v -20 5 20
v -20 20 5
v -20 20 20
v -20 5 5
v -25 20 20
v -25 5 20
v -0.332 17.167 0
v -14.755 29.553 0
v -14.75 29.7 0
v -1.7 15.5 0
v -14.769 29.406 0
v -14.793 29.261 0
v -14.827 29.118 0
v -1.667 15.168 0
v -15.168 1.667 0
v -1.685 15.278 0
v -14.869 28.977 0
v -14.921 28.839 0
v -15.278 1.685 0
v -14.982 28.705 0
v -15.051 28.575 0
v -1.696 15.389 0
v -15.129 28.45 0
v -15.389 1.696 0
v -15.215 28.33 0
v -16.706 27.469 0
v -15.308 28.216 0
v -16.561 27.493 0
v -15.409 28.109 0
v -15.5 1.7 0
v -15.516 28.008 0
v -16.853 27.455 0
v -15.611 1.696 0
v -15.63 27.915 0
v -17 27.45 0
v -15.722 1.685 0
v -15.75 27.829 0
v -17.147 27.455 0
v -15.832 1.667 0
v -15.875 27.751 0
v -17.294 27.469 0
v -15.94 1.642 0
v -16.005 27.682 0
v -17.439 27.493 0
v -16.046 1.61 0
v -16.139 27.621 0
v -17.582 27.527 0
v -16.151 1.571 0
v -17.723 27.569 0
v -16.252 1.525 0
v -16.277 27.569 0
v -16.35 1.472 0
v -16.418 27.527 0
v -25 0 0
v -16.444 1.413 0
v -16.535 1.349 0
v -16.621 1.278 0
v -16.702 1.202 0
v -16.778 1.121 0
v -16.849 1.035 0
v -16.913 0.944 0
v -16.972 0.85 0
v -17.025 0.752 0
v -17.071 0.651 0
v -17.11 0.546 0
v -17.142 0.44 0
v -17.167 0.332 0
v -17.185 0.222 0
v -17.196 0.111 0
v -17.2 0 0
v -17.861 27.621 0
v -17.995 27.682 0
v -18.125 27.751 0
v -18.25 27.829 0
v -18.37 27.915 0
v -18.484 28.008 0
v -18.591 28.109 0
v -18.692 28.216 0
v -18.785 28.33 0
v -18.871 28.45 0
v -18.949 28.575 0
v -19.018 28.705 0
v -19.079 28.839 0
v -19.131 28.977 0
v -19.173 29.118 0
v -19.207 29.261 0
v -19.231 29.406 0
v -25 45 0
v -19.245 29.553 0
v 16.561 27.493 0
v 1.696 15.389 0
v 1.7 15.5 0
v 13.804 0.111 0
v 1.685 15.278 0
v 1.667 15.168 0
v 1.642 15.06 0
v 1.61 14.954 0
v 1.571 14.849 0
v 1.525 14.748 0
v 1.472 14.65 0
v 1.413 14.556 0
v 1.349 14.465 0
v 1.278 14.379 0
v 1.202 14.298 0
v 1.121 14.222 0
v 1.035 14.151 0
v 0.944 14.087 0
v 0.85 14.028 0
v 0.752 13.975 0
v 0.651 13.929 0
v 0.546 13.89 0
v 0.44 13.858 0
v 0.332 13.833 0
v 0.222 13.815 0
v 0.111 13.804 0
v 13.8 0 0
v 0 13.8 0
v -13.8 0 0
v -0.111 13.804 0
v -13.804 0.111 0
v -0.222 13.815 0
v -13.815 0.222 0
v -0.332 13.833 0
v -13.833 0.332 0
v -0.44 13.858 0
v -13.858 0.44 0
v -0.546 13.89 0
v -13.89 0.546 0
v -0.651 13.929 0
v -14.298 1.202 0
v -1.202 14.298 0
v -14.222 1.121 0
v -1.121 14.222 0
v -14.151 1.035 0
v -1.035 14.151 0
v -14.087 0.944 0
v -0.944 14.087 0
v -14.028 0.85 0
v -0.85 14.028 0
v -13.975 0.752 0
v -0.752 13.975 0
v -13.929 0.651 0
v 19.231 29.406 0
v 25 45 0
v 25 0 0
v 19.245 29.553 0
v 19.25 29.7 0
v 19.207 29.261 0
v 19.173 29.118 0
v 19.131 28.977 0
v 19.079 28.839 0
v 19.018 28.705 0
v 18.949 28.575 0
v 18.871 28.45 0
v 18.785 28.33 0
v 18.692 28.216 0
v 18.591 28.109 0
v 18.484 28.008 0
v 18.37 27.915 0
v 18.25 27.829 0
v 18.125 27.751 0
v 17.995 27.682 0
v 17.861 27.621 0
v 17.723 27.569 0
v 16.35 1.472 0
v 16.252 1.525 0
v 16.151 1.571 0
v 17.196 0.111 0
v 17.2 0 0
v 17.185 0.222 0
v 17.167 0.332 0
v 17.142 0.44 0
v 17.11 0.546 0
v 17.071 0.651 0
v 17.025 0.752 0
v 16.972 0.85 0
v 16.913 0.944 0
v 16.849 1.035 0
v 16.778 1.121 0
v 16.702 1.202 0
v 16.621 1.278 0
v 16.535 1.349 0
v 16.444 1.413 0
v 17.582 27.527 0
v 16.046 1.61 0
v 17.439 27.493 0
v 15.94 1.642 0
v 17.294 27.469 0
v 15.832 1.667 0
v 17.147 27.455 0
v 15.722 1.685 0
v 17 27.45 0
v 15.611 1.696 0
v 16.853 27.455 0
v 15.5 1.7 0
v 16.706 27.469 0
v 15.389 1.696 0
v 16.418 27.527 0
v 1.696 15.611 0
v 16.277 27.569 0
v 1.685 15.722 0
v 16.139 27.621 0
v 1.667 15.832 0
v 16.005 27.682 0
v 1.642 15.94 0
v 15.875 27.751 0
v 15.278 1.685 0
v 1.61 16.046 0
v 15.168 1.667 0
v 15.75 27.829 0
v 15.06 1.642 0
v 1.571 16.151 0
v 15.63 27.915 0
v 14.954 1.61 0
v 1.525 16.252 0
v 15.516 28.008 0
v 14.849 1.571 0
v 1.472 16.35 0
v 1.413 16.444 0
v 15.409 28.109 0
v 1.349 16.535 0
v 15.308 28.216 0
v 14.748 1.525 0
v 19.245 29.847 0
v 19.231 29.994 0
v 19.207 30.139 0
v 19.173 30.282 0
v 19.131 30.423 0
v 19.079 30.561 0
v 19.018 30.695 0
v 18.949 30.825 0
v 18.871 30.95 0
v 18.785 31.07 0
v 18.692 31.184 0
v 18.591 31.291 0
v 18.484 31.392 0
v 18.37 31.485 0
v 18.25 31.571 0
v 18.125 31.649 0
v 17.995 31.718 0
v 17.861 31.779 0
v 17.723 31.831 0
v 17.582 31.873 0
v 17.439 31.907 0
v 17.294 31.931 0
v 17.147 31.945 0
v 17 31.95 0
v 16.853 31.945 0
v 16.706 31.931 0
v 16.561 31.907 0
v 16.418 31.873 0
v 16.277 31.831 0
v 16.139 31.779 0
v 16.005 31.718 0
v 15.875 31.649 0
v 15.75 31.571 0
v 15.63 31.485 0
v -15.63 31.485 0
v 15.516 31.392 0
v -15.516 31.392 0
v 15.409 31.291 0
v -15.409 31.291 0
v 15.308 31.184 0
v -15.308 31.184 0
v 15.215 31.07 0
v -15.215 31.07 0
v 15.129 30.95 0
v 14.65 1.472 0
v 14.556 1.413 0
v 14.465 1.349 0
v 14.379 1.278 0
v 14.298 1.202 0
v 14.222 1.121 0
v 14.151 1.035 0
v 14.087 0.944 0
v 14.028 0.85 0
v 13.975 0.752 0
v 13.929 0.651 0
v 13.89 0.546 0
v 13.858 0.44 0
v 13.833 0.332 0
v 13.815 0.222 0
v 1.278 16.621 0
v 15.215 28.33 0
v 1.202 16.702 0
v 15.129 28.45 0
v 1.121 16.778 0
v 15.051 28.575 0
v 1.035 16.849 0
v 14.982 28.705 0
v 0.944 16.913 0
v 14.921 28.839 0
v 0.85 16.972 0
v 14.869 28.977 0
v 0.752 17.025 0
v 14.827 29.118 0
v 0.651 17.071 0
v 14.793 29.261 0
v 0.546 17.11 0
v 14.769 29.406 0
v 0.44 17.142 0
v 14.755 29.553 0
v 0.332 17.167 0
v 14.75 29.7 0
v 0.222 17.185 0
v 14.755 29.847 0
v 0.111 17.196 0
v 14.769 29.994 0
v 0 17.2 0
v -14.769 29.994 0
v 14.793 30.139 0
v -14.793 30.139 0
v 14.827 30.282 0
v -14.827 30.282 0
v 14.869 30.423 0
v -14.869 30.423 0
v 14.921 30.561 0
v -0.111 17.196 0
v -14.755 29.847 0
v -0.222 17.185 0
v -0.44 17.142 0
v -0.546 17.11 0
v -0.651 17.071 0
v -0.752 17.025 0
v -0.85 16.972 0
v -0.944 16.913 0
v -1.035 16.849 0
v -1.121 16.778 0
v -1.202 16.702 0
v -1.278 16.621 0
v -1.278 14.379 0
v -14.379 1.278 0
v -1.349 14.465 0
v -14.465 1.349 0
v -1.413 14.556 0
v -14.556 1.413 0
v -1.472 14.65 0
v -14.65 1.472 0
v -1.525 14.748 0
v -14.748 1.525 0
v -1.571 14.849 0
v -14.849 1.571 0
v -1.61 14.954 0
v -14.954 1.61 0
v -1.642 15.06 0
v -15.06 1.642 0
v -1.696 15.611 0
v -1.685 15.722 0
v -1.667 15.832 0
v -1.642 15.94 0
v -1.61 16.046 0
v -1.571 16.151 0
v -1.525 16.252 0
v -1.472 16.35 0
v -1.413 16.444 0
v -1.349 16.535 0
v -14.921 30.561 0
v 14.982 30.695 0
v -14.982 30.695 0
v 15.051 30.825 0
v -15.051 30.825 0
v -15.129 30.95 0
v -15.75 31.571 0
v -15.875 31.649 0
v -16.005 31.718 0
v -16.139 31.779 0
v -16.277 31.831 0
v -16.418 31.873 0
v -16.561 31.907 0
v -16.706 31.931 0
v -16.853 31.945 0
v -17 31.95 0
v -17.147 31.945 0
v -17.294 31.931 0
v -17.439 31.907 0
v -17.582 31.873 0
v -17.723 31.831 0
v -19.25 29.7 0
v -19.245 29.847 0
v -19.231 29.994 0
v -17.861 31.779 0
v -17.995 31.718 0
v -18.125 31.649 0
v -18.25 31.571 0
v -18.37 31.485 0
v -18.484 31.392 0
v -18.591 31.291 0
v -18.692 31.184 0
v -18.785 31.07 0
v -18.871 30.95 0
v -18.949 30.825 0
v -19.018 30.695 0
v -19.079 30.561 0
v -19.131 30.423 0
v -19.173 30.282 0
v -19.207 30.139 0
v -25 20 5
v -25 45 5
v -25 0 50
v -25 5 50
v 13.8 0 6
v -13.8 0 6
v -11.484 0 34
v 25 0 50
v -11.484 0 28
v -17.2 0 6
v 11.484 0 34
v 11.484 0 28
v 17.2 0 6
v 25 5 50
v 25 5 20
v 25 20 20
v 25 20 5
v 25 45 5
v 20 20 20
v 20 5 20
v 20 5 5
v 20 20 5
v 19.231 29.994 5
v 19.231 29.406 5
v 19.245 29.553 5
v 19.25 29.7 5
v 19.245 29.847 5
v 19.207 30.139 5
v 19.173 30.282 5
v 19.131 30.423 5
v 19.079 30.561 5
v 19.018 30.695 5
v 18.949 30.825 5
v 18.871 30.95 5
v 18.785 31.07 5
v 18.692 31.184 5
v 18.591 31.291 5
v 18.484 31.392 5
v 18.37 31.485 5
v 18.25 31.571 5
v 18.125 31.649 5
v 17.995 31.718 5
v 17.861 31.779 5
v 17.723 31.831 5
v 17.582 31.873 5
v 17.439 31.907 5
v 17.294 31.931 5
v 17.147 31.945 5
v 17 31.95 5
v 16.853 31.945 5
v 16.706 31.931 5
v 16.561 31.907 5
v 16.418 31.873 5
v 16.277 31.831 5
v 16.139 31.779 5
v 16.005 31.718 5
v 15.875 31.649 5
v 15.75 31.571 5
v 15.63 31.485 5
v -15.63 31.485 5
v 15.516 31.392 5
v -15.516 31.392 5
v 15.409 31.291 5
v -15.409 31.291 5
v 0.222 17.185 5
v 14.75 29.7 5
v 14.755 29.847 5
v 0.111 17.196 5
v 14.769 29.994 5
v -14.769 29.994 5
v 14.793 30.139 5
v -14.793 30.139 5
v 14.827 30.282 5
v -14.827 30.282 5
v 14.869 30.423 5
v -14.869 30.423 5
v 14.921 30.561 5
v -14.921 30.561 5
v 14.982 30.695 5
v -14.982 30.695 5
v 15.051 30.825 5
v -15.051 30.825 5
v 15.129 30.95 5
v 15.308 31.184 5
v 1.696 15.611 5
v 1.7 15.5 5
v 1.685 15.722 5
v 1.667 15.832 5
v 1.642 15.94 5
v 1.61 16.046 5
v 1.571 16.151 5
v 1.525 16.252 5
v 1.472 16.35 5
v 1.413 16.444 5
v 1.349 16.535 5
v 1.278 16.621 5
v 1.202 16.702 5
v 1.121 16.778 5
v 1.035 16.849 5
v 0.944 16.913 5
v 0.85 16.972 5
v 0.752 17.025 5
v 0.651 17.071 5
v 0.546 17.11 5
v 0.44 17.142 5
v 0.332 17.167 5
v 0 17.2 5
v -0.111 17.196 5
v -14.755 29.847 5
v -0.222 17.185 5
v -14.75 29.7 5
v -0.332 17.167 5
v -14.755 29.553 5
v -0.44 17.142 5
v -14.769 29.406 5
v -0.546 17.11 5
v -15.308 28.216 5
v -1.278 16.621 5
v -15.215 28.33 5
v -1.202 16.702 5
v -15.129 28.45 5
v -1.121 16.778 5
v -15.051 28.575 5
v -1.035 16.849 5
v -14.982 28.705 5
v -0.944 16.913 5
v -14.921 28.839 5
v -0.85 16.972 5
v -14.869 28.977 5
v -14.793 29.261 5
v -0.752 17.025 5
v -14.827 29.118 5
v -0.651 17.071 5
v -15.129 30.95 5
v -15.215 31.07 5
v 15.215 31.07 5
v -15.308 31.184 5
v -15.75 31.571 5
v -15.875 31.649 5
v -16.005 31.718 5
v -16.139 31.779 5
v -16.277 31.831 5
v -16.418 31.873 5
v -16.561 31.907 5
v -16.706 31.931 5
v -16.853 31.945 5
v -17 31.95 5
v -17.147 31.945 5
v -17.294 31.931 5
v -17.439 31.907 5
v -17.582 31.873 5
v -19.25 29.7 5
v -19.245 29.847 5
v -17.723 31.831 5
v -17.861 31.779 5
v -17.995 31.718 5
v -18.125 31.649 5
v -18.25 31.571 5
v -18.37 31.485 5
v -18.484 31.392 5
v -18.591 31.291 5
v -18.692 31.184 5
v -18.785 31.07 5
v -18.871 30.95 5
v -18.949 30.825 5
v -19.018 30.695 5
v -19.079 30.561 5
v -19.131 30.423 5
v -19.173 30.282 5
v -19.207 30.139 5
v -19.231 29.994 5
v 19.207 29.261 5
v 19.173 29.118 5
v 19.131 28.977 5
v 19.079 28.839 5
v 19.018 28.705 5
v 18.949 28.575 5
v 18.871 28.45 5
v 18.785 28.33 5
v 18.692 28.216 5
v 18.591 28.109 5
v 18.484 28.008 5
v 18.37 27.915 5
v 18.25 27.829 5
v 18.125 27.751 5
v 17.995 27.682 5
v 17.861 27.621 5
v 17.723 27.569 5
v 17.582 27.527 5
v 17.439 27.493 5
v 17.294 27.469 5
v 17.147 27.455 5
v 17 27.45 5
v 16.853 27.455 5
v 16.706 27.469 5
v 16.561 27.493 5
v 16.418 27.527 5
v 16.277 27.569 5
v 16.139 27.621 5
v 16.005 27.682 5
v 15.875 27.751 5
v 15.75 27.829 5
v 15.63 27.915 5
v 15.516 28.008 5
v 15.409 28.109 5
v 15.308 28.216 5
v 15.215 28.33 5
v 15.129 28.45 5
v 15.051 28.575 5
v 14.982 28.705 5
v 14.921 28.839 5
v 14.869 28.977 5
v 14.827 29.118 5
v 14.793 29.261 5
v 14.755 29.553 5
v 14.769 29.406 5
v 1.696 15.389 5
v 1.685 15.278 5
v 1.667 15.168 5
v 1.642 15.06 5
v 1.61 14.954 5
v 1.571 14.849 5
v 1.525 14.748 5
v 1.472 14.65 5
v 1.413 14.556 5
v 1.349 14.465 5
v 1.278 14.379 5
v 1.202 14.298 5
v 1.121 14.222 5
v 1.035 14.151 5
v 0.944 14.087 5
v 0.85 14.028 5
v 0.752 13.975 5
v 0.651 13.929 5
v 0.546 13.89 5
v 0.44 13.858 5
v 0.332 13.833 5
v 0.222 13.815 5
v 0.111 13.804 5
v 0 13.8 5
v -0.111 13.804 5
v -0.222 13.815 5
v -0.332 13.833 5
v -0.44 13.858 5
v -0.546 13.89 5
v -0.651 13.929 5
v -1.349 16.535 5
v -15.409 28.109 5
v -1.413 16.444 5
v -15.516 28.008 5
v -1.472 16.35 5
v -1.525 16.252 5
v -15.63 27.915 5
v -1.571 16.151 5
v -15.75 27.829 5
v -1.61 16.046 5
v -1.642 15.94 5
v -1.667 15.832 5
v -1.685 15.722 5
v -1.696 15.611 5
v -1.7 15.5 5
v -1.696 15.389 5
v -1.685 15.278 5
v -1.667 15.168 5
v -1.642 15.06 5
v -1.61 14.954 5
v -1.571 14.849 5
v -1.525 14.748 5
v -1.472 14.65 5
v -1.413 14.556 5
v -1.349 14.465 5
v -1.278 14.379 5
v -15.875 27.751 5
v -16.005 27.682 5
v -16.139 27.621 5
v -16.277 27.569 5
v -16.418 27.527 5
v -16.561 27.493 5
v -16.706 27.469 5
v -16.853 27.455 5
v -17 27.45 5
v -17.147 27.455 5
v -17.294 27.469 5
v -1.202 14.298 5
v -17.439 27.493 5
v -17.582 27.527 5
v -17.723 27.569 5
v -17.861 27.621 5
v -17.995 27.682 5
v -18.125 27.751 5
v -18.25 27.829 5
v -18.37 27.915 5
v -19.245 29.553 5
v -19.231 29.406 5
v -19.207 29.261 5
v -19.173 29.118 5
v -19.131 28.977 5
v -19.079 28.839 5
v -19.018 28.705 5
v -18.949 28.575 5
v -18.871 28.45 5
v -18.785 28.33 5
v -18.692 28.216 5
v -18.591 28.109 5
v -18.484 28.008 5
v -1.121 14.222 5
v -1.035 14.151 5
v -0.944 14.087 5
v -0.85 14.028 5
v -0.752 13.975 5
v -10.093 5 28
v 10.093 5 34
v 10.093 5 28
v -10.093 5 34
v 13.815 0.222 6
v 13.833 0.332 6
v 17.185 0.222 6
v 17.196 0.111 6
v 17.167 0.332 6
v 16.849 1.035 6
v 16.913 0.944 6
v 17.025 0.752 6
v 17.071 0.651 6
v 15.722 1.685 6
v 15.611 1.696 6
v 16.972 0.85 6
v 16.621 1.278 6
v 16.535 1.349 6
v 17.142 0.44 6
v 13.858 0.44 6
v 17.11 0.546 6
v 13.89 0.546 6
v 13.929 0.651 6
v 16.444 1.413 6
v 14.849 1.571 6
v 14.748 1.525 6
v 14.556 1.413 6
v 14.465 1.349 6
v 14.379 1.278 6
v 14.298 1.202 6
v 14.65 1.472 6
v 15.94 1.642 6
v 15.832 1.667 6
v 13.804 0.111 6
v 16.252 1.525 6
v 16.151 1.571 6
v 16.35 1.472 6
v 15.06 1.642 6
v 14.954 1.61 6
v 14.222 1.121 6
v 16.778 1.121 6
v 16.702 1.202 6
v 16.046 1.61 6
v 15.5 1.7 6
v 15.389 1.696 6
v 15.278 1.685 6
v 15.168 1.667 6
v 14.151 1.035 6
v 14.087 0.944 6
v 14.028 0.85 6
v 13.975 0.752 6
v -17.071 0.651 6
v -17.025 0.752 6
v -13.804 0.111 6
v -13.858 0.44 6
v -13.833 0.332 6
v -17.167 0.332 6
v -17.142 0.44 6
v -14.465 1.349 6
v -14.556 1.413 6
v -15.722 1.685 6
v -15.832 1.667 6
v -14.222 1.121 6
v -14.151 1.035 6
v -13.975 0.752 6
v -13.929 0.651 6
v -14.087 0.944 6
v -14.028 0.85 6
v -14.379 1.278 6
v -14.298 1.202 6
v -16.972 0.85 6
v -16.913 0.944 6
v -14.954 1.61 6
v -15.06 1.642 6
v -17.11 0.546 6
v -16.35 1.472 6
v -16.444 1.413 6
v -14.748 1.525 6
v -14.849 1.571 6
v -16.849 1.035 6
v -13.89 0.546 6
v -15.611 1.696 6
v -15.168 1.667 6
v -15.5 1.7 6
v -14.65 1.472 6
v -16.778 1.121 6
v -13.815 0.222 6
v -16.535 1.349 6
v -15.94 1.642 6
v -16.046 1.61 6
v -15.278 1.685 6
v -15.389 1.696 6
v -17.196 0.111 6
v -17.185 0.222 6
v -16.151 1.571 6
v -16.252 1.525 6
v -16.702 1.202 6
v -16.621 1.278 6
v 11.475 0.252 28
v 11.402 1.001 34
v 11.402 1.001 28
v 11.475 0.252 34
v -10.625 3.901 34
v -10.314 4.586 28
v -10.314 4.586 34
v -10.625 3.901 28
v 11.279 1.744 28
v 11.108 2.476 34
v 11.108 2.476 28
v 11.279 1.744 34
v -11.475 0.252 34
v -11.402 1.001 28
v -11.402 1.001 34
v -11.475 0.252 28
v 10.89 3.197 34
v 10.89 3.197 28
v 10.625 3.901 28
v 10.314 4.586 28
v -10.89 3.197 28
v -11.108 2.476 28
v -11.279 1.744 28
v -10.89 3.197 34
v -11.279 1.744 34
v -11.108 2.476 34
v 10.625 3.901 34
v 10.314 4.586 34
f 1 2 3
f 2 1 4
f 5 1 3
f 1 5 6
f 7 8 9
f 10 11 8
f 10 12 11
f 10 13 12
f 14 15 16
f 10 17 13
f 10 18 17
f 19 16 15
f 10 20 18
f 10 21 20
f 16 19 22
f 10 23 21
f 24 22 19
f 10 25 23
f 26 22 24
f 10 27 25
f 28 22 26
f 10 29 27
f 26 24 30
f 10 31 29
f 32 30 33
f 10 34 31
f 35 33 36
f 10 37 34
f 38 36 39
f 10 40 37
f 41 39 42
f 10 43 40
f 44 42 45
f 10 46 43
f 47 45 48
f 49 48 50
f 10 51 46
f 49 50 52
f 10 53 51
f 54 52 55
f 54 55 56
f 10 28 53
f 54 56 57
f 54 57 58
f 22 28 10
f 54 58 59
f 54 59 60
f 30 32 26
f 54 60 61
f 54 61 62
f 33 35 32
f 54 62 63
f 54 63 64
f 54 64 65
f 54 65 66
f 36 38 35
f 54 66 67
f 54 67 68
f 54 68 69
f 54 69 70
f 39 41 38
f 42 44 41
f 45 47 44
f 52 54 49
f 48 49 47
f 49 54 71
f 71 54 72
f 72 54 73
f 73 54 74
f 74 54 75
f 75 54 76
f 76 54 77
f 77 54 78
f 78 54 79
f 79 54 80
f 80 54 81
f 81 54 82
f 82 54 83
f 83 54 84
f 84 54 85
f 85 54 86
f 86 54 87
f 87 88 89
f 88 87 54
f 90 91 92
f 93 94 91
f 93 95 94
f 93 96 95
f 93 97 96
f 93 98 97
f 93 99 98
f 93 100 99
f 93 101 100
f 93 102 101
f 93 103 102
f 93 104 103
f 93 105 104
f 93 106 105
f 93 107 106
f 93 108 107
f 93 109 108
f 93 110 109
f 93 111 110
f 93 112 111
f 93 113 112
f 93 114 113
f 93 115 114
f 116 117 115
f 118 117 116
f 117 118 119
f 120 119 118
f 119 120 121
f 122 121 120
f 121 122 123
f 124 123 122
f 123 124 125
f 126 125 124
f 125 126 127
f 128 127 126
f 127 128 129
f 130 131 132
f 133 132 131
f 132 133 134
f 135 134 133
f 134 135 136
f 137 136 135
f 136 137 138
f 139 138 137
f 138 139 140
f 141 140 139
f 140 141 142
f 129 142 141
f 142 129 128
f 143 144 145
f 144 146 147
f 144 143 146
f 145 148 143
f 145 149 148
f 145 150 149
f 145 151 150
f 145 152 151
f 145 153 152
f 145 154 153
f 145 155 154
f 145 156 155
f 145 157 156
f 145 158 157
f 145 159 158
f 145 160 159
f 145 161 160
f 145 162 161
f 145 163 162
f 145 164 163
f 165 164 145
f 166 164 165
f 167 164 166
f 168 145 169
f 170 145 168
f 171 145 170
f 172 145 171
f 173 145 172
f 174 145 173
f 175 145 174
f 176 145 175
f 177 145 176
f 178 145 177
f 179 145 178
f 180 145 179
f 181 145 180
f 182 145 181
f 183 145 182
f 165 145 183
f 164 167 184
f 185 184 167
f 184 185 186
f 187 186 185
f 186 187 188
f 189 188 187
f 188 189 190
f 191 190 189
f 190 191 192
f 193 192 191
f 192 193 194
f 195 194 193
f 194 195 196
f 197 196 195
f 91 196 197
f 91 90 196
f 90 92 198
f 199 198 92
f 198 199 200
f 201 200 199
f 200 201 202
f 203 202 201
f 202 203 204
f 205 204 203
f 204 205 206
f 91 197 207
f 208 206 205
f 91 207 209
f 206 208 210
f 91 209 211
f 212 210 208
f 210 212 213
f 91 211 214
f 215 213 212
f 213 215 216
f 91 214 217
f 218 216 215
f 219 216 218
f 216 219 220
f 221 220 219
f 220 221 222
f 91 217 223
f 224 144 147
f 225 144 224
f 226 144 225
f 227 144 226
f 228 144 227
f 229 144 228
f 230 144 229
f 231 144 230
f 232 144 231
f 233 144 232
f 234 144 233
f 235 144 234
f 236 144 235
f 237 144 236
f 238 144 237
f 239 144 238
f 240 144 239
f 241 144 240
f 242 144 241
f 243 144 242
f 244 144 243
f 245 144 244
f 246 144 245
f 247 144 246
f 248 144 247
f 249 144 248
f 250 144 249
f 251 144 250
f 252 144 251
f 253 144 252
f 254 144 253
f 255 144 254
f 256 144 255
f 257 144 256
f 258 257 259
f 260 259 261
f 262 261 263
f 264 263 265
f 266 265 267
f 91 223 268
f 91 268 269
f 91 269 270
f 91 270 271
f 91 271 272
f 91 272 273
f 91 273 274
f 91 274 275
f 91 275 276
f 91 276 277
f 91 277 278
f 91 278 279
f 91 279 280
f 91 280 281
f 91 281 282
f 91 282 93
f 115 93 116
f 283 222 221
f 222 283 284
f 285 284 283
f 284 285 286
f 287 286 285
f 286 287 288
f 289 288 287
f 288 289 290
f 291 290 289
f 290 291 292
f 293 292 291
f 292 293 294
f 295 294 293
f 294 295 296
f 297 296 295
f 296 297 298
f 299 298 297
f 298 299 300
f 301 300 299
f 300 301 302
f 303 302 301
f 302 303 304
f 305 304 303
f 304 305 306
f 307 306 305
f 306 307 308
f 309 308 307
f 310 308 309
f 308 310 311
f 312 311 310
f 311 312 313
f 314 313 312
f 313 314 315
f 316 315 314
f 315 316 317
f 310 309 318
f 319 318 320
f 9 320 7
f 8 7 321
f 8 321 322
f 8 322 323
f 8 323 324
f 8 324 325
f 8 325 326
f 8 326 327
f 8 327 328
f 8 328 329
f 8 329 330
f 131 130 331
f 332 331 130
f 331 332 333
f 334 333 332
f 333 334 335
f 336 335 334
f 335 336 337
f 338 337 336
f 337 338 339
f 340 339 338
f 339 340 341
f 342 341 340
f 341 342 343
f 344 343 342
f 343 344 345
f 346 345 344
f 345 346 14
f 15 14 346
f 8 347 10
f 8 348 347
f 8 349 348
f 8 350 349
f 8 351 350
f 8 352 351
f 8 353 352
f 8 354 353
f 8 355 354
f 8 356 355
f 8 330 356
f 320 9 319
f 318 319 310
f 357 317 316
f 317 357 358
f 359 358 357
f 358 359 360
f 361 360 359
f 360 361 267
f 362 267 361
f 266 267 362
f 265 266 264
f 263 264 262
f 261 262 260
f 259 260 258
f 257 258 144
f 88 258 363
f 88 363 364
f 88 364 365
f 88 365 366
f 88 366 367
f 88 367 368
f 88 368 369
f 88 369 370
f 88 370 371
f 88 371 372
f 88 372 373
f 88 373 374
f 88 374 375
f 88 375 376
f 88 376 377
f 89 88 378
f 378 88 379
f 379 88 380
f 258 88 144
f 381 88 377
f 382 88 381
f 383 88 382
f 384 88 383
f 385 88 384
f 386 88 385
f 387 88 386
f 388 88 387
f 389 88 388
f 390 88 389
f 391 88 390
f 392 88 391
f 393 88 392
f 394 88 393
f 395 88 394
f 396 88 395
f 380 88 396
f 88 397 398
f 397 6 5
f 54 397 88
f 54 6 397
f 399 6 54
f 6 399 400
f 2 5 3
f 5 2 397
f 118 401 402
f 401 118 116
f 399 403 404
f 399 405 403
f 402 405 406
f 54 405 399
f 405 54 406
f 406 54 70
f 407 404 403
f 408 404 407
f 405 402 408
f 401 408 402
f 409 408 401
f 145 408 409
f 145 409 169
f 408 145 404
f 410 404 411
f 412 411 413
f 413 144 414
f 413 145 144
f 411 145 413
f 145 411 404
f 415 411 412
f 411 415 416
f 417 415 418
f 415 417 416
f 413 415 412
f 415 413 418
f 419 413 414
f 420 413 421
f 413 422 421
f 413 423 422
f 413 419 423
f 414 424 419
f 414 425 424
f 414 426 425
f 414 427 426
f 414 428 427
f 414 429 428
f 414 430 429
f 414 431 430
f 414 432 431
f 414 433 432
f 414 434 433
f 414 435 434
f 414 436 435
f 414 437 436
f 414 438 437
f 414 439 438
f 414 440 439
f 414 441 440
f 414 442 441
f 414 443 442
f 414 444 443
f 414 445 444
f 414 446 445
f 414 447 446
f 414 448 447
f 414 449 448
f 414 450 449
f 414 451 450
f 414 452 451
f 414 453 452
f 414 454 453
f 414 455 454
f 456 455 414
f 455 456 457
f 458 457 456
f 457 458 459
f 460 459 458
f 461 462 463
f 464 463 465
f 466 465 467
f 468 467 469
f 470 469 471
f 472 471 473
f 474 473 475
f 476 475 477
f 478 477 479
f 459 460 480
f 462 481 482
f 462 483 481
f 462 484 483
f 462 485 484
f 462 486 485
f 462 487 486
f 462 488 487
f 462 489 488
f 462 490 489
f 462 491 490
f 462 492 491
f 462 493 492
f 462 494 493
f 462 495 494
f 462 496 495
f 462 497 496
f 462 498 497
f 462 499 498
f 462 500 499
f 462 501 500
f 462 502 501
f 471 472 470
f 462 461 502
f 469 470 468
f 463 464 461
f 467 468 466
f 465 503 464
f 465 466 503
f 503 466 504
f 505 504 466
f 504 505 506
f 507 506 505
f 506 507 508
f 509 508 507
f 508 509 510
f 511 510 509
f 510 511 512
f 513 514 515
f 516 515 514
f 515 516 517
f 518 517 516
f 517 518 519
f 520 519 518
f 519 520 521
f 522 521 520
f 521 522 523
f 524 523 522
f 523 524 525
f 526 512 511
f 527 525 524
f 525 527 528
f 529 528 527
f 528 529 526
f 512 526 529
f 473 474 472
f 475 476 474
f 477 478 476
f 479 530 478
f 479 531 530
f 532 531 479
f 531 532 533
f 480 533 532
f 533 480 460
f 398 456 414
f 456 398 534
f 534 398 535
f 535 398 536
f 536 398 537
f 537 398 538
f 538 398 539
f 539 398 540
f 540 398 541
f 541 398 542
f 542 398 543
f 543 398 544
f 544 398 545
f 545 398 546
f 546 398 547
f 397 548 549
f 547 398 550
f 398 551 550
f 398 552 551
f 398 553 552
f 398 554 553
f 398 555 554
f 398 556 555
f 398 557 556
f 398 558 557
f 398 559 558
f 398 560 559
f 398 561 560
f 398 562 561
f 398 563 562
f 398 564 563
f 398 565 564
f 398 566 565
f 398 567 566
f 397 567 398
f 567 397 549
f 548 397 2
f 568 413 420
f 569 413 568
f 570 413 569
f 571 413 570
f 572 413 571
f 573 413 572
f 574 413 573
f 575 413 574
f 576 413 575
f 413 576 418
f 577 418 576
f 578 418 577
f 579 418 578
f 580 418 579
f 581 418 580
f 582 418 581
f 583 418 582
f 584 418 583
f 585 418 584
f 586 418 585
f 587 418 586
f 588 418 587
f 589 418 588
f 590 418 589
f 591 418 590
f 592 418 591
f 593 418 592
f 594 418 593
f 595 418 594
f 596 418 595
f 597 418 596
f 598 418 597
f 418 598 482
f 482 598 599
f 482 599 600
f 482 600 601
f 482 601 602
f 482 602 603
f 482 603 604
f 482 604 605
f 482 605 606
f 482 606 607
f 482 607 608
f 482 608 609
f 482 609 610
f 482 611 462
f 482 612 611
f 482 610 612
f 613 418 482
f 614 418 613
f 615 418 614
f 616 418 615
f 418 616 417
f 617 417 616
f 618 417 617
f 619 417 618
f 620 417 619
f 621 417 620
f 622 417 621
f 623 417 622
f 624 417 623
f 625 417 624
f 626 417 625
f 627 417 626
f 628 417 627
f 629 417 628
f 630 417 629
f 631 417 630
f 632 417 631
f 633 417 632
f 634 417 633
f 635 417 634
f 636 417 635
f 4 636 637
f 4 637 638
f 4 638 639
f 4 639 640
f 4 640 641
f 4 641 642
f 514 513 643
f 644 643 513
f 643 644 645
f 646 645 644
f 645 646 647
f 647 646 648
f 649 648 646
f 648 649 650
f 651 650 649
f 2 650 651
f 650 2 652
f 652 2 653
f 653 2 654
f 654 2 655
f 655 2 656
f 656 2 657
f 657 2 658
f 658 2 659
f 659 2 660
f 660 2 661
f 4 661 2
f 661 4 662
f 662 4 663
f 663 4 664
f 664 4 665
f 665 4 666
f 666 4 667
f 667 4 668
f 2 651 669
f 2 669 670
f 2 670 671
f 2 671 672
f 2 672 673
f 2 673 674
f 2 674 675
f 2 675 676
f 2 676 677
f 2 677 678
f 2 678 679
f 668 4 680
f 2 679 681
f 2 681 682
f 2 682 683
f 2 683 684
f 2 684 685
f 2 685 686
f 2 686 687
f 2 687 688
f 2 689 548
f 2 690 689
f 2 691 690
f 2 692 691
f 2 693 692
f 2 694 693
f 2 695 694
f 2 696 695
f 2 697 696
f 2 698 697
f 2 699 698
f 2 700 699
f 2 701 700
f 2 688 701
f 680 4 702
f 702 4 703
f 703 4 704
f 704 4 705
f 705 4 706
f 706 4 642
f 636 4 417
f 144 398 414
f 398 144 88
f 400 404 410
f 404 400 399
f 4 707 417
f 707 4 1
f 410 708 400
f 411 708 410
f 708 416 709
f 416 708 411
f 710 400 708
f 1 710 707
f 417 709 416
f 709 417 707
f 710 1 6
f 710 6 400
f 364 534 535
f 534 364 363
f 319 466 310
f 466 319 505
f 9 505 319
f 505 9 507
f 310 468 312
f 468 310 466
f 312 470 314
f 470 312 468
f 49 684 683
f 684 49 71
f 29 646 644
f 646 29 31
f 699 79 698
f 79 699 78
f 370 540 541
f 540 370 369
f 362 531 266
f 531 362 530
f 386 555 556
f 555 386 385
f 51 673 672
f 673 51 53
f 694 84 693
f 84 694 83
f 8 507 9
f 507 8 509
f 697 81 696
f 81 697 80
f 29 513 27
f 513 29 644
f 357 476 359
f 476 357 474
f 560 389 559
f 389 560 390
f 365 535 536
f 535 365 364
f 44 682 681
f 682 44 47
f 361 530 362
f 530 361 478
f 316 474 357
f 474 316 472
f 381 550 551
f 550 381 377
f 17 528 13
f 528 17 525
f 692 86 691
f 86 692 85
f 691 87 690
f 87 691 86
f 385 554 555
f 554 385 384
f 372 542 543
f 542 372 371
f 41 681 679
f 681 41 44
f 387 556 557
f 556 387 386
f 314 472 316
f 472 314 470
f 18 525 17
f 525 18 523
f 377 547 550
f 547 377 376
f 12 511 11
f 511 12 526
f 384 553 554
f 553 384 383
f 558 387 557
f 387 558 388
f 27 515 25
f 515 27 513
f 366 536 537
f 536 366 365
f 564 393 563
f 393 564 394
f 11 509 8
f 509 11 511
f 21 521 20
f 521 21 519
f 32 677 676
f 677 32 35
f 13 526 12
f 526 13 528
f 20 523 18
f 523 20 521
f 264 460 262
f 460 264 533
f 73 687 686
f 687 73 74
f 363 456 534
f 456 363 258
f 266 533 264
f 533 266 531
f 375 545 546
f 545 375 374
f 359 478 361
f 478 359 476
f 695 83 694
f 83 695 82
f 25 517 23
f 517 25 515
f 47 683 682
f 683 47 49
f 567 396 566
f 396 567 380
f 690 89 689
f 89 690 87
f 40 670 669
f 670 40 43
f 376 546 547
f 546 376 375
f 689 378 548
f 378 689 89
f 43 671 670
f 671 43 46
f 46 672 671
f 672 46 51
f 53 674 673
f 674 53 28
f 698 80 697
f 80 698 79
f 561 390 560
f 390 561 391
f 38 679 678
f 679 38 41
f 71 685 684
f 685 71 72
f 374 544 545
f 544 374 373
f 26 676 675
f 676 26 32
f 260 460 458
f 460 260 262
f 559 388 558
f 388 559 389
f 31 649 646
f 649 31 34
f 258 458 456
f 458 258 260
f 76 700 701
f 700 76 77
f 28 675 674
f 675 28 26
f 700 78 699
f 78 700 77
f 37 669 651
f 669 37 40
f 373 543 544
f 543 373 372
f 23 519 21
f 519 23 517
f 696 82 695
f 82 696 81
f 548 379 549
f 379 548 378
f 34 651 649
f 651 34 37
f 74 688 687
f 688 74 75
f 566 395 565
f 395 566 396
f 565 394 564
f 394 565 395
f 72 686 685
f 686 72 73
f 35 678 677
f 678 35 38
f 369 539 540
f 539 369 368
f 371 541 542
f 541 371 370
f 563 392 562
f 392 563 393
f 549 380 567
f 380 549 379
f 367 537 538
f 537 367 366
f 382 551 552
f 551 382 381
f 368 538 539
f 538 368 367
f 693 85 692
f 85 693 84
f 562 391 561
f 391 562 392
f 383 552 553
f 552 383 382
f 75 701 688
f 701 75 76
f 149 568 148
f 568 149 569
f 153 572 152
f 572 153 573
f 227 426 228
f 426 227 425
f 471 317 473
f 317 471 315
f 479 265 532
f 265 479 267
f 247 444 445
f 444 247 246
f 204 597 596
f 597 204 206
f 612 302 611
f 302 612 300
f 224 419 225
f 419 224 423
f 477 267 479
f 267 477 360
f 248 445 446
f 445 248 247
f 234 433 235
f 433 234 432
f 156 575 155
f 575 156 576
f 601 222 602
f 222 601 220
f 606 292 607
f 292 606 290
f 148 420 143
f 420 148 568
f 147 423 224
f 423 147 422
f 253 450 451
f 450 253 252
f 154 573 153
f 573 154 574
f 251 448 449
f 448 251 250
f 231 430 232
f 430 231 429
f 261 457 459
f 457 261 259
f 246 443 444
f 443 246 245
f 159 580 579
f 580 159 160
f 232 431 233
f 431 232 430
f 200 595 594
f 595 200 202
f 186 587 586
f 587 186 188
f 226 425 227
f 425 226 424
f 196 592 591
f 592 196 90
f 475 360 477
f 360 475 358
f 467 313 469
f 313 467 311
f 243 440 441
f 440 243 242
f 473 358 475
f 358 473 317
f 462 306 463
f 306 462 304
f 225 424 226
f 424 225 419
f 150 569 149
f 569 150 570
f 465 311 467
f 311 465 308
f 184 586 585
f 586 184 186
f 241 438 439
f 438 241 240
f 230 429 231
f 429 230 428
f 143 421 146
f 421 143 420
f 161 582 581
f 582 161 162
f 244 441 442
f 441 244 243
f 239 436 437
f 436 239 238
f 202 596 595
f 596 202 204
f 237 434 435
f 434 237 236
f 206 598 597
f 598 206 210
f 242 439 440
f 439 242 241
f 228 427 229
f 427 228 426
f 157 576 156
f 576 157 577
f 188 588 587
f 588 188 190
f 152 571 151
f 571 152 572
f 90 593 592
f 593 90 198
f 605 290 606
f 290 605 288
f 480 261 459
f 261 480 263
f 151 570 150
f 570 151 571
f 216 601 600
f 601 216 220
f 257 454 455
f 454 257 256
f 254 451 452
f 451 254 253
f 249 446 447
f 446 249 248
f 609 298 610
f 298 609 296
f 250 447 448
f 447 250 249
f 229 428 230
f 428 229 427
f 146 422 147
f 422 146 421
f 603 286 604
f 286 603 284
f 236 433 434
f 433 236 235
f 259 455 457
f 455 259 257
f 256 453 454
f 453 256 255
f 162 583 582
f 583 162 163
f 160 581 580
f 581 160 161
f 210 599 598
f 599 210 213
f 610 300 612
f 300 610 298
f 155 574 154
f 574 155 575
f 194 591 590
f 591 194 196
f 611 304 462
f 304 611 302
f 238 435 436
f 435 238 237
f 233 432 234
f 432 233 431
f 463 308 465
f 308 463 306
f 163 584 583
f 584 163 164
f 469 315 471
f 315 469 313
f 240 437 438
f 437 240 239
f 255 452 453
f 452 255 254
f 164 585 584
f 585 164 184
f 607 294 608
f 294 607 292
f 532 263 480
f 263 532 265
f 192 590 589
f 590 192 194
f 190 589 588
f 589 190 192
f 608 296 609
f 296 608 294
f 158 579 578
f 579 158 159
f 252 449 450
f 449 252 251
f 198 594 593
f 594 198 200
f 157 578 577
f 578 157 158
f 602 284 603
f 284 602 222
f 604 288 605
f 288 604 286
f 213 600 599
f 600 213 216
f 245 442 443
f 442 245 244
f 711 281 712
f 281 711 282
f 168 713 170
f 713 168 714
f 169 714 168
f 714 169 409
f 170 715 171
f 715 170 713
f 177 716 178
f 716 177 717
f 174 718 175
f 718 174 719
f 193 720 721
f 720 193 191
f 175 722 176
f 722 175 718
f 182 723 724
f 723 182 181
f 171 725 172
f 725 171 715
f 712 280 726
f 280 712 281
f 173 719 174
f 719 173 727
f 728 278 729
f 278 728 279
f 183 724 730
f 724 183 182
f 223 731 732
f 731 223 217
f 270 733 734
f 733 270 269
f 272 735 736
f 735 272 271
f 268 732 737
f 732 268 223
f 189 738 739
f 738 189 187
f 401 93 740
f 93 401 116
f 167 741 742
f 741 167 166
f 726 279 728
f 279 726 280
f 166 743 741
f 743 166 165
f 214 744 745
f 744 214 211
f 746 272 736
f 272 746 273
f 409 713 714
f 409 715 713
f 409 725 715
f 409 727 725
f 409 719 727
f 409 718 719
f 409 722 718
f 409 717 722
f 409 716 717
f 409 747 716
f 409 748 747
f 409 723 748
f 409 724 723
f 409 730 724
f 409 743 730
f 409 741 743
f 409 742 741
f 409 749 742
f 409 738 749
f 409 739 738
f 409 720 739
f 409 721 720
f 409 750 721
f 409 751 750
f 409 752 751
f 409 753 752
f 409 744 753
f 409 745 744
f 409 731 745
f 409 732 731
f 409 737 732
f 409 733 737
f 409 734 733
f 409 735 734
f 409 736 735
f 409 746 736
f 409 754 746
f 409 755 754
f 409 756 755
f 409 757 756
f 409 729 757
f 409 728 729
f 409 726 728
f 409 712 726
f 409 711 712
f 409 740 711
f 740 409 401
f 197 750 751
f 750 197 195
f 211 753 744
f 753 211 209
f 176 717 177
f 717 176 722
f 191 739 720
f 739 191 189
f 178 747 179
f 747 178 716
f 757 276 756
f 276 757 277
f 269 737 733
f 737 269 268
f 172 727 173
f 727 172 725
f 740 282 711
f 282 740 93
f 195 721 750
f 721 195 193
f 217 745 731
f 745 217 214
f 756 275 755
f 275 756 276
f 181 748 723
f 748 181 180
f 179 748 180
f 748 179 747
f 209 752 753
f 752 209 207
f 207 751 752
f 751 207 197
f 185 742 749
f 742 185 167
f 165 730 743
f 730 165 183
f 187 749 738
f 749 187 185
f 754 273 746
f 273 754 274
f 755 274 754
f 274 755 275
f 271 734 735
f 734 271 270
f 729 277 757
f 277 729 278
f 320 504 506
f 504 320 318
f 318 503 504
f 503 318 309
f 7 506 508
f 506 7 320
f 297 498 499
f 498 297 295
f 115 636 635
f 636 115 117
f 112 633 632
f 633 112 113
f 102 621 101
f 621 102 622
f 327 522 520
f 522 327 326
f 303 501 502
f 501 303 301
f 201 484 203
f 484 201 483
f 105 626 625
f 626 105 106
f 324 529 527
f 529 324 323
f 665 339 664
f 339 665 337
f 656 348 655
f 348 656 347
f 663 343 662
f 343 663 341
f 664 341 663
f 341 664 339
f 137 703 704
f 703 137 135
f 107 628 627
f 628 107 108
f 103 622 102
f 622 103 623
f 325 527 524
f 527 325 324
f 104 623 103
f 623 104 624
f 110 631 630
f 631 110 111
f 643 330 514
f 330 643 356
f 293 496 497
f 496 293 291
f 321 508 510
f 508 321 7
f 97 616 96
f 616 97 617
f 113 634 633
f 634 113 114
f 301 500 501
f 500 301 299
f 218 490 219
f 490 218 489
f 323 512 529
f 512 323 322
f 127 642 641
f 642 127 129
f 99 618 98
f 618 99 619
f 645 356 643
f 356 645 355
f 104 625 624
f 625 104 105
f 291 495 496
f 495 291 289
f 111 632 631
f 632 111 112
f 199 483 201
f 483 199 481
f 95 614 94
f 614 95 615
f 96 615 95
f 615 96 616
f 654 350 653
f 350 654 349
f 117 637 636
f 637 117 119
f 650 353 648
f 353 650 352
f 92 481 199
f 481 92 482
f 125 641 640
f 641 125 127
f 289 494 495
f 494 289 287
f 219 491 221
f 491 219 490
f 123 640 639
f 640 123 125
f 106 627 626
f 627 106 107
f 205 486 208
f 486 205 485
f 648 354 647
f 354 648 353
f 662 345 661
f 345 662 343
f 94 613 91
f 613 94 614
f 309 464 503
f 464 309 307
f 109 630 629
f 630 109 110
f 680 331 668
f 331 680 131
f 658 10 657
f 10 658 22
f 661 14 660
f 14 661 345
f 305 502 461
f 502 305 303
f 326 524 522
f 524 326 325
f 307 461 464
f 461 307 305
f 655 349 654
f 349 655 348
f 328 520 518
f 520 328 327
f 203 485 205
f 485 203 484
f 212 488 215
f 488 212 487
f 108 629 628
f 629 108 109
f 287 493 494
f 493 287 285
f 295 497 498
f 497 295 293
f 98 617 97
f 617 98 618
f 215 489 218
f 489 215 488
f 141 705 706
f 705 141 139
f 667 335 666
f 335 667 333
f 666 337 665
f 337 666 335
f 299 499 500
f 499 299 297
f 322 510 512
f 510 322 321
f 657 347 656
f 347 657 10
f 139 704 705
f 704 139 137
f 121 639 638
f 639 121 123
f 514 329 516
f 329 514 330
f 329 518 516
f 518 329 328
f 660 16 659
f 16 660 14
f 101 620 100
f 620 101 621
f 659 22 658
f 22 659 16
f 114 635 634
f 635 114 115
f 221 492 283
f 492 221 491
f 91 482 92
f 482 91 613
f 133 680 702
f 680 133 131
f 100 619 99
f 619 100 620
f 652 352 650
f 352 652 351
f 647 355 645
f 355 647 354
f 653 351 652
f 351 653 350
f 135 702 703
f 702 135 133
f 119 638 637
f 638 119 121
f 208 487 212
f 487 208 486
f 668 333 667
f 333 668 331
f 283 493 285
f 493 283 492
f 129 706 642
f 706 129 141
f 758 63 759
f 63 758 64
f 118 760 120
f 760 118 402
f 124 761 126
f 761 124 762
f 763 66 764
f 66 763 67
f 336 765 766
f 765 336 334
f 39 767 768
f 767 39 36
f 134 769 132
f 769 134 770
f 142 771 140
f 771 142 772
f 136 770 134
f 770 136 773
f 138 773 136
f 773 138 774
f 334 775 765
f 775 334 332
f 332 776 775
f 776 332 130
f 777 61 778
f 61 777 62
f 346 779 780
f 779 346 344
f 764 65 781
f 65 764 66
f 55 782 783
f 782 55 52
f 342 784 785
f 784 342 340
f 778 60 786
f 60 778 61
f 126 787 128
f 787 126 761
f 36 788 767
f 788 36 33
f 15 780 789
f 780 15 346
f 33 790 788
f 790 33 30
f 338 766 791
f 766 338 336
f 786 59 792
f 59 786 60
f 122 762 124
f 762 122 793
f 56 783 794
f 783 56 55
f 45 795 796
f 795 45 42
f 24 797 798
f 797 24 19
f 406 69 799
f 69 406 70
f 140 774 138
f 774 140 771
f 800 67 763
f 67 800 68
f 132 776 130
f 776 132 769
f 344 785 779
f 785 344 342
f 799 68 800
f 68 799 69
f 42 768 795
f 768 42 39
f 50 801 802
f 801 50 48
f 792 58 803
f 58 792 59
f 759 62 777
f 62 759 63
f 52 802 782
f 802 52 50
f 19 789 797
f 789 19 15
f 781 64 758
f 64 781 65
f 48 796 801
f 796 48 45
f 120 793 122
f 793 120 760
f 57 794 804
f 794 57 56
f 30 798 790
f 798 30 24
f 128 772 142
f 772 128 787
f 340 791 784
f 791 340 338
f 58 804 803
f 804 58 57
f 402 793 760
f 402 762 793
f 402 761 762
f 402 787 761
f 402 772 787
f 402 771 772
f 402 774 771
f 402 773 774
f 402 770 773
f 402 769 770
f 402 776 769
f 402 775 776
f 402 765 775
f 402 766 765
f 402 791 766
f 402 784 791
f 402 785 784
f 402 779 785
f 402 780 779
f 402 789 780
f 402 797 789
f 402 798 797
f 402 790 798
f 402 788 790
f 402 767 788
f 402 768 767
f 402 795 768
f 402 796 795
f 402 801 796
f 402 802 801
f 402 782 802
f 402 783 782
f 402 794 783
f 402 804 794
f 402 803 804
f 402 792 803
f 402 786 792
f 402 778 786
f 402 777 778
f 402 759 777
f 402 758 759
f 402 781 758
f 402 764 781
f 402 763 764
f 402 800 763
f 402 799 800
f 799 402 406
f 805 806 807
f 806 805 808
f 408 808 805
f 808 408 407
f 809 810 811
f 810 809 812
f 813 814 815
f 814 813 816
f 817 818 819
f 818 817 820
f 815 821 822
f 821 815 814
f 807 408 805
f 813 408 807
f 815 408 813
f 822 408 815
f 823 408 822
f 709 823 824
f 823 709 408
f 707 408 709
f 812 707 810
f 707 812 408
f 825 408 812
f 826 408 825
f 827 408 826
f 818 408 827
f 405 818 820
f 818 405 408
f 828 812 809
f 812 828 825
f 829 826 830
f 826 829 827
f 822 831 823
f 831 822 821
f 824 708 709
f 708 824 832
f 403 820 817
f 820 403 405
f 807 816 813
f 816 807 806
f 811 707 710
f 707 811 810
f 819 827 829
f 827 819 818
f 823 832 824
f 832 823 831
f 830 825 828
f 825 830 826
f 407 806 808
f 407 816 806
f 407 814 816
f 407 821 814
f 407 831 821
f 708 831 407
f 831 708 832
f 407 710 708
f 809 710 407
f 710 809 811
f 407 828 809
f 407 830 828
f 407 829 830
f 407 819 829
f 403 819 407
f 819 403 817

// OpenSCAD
// L-shaped mounting bracket for a NEMA 17 stepper motor (e.g. syringe pump)
// Print orientation: base plate on the bed, motor plate building up in +Z

// ---------------- Parameters ----------------
base_x      = 25;    // base plate half-length in X (mm)
base_y      = 45;    // base plate length in Y (mm)
base_t      = 5;     // base plate thickness in Z (mm)

motor_h     = 50;    // motor plate height in Z (mm)
motor_w     = 5;     // motor plate thickness in Y (mm)

boss_d      = 23;    // motor centring boss hole diameter (mm)
boss_x      = 0;     // boss hole centre X (mm)
boss_z      = 28;    // boss hole centre Z (mm)

screw_d     = 3.4;   // M3 screw hole diameter (mm)
screw_pitch = 31;    // square pattern side length for screw holes (mm)

gusset_t    = 5;     // gusset thickness (mm)
gusset_leg  = 20;    // right-triangle leg length along Y and Z (mm)

eps         = 0.5;   // cutter overshoot past faces (mm)
$fn         = 96;    // curve resolution

// ---------------- Model ----------------
difference() {
    union() {
        // Base plate
        translate([-base_x, 0, 0])
            cube([2 * base_x, base_y, base_t]);

        // Vertical motor plate, standing on the back edge of the base
        translate([-base_x, 0, 0])
            cube([2 * base_x, motor_w, motor_h]);

        // Triangular gussets, flush with the left and right edges
        for (sx = [-1, 1])
            translate([sx > 0 ? 20 : -25, 0, 0])
                cube([gusset_t, gusset_leg, gusset_leg]);
    }

    // Base plate through-holes (M4)
    for (bx = [-17, 17])
        translate([bx, base_y * 0.66, -eps])
            cylinder(d = 4.5, h = base_t + 2 * eps);

    // Motor plate boss hole
    translate([boss_x, -eps, boss_z])
        cylinder(d = boss_d, h = motor_w + 2 * eps);

    // M3 screw holes on a square pattern centred on the boss hole
    for (a = [0, 90, 180, 270])
        rotate([0, 0, a])
            translate([screw_pitch / 2, 0, 0])
                cylinder(d = screw_d, h = motor_w + 2 * eps);
}
